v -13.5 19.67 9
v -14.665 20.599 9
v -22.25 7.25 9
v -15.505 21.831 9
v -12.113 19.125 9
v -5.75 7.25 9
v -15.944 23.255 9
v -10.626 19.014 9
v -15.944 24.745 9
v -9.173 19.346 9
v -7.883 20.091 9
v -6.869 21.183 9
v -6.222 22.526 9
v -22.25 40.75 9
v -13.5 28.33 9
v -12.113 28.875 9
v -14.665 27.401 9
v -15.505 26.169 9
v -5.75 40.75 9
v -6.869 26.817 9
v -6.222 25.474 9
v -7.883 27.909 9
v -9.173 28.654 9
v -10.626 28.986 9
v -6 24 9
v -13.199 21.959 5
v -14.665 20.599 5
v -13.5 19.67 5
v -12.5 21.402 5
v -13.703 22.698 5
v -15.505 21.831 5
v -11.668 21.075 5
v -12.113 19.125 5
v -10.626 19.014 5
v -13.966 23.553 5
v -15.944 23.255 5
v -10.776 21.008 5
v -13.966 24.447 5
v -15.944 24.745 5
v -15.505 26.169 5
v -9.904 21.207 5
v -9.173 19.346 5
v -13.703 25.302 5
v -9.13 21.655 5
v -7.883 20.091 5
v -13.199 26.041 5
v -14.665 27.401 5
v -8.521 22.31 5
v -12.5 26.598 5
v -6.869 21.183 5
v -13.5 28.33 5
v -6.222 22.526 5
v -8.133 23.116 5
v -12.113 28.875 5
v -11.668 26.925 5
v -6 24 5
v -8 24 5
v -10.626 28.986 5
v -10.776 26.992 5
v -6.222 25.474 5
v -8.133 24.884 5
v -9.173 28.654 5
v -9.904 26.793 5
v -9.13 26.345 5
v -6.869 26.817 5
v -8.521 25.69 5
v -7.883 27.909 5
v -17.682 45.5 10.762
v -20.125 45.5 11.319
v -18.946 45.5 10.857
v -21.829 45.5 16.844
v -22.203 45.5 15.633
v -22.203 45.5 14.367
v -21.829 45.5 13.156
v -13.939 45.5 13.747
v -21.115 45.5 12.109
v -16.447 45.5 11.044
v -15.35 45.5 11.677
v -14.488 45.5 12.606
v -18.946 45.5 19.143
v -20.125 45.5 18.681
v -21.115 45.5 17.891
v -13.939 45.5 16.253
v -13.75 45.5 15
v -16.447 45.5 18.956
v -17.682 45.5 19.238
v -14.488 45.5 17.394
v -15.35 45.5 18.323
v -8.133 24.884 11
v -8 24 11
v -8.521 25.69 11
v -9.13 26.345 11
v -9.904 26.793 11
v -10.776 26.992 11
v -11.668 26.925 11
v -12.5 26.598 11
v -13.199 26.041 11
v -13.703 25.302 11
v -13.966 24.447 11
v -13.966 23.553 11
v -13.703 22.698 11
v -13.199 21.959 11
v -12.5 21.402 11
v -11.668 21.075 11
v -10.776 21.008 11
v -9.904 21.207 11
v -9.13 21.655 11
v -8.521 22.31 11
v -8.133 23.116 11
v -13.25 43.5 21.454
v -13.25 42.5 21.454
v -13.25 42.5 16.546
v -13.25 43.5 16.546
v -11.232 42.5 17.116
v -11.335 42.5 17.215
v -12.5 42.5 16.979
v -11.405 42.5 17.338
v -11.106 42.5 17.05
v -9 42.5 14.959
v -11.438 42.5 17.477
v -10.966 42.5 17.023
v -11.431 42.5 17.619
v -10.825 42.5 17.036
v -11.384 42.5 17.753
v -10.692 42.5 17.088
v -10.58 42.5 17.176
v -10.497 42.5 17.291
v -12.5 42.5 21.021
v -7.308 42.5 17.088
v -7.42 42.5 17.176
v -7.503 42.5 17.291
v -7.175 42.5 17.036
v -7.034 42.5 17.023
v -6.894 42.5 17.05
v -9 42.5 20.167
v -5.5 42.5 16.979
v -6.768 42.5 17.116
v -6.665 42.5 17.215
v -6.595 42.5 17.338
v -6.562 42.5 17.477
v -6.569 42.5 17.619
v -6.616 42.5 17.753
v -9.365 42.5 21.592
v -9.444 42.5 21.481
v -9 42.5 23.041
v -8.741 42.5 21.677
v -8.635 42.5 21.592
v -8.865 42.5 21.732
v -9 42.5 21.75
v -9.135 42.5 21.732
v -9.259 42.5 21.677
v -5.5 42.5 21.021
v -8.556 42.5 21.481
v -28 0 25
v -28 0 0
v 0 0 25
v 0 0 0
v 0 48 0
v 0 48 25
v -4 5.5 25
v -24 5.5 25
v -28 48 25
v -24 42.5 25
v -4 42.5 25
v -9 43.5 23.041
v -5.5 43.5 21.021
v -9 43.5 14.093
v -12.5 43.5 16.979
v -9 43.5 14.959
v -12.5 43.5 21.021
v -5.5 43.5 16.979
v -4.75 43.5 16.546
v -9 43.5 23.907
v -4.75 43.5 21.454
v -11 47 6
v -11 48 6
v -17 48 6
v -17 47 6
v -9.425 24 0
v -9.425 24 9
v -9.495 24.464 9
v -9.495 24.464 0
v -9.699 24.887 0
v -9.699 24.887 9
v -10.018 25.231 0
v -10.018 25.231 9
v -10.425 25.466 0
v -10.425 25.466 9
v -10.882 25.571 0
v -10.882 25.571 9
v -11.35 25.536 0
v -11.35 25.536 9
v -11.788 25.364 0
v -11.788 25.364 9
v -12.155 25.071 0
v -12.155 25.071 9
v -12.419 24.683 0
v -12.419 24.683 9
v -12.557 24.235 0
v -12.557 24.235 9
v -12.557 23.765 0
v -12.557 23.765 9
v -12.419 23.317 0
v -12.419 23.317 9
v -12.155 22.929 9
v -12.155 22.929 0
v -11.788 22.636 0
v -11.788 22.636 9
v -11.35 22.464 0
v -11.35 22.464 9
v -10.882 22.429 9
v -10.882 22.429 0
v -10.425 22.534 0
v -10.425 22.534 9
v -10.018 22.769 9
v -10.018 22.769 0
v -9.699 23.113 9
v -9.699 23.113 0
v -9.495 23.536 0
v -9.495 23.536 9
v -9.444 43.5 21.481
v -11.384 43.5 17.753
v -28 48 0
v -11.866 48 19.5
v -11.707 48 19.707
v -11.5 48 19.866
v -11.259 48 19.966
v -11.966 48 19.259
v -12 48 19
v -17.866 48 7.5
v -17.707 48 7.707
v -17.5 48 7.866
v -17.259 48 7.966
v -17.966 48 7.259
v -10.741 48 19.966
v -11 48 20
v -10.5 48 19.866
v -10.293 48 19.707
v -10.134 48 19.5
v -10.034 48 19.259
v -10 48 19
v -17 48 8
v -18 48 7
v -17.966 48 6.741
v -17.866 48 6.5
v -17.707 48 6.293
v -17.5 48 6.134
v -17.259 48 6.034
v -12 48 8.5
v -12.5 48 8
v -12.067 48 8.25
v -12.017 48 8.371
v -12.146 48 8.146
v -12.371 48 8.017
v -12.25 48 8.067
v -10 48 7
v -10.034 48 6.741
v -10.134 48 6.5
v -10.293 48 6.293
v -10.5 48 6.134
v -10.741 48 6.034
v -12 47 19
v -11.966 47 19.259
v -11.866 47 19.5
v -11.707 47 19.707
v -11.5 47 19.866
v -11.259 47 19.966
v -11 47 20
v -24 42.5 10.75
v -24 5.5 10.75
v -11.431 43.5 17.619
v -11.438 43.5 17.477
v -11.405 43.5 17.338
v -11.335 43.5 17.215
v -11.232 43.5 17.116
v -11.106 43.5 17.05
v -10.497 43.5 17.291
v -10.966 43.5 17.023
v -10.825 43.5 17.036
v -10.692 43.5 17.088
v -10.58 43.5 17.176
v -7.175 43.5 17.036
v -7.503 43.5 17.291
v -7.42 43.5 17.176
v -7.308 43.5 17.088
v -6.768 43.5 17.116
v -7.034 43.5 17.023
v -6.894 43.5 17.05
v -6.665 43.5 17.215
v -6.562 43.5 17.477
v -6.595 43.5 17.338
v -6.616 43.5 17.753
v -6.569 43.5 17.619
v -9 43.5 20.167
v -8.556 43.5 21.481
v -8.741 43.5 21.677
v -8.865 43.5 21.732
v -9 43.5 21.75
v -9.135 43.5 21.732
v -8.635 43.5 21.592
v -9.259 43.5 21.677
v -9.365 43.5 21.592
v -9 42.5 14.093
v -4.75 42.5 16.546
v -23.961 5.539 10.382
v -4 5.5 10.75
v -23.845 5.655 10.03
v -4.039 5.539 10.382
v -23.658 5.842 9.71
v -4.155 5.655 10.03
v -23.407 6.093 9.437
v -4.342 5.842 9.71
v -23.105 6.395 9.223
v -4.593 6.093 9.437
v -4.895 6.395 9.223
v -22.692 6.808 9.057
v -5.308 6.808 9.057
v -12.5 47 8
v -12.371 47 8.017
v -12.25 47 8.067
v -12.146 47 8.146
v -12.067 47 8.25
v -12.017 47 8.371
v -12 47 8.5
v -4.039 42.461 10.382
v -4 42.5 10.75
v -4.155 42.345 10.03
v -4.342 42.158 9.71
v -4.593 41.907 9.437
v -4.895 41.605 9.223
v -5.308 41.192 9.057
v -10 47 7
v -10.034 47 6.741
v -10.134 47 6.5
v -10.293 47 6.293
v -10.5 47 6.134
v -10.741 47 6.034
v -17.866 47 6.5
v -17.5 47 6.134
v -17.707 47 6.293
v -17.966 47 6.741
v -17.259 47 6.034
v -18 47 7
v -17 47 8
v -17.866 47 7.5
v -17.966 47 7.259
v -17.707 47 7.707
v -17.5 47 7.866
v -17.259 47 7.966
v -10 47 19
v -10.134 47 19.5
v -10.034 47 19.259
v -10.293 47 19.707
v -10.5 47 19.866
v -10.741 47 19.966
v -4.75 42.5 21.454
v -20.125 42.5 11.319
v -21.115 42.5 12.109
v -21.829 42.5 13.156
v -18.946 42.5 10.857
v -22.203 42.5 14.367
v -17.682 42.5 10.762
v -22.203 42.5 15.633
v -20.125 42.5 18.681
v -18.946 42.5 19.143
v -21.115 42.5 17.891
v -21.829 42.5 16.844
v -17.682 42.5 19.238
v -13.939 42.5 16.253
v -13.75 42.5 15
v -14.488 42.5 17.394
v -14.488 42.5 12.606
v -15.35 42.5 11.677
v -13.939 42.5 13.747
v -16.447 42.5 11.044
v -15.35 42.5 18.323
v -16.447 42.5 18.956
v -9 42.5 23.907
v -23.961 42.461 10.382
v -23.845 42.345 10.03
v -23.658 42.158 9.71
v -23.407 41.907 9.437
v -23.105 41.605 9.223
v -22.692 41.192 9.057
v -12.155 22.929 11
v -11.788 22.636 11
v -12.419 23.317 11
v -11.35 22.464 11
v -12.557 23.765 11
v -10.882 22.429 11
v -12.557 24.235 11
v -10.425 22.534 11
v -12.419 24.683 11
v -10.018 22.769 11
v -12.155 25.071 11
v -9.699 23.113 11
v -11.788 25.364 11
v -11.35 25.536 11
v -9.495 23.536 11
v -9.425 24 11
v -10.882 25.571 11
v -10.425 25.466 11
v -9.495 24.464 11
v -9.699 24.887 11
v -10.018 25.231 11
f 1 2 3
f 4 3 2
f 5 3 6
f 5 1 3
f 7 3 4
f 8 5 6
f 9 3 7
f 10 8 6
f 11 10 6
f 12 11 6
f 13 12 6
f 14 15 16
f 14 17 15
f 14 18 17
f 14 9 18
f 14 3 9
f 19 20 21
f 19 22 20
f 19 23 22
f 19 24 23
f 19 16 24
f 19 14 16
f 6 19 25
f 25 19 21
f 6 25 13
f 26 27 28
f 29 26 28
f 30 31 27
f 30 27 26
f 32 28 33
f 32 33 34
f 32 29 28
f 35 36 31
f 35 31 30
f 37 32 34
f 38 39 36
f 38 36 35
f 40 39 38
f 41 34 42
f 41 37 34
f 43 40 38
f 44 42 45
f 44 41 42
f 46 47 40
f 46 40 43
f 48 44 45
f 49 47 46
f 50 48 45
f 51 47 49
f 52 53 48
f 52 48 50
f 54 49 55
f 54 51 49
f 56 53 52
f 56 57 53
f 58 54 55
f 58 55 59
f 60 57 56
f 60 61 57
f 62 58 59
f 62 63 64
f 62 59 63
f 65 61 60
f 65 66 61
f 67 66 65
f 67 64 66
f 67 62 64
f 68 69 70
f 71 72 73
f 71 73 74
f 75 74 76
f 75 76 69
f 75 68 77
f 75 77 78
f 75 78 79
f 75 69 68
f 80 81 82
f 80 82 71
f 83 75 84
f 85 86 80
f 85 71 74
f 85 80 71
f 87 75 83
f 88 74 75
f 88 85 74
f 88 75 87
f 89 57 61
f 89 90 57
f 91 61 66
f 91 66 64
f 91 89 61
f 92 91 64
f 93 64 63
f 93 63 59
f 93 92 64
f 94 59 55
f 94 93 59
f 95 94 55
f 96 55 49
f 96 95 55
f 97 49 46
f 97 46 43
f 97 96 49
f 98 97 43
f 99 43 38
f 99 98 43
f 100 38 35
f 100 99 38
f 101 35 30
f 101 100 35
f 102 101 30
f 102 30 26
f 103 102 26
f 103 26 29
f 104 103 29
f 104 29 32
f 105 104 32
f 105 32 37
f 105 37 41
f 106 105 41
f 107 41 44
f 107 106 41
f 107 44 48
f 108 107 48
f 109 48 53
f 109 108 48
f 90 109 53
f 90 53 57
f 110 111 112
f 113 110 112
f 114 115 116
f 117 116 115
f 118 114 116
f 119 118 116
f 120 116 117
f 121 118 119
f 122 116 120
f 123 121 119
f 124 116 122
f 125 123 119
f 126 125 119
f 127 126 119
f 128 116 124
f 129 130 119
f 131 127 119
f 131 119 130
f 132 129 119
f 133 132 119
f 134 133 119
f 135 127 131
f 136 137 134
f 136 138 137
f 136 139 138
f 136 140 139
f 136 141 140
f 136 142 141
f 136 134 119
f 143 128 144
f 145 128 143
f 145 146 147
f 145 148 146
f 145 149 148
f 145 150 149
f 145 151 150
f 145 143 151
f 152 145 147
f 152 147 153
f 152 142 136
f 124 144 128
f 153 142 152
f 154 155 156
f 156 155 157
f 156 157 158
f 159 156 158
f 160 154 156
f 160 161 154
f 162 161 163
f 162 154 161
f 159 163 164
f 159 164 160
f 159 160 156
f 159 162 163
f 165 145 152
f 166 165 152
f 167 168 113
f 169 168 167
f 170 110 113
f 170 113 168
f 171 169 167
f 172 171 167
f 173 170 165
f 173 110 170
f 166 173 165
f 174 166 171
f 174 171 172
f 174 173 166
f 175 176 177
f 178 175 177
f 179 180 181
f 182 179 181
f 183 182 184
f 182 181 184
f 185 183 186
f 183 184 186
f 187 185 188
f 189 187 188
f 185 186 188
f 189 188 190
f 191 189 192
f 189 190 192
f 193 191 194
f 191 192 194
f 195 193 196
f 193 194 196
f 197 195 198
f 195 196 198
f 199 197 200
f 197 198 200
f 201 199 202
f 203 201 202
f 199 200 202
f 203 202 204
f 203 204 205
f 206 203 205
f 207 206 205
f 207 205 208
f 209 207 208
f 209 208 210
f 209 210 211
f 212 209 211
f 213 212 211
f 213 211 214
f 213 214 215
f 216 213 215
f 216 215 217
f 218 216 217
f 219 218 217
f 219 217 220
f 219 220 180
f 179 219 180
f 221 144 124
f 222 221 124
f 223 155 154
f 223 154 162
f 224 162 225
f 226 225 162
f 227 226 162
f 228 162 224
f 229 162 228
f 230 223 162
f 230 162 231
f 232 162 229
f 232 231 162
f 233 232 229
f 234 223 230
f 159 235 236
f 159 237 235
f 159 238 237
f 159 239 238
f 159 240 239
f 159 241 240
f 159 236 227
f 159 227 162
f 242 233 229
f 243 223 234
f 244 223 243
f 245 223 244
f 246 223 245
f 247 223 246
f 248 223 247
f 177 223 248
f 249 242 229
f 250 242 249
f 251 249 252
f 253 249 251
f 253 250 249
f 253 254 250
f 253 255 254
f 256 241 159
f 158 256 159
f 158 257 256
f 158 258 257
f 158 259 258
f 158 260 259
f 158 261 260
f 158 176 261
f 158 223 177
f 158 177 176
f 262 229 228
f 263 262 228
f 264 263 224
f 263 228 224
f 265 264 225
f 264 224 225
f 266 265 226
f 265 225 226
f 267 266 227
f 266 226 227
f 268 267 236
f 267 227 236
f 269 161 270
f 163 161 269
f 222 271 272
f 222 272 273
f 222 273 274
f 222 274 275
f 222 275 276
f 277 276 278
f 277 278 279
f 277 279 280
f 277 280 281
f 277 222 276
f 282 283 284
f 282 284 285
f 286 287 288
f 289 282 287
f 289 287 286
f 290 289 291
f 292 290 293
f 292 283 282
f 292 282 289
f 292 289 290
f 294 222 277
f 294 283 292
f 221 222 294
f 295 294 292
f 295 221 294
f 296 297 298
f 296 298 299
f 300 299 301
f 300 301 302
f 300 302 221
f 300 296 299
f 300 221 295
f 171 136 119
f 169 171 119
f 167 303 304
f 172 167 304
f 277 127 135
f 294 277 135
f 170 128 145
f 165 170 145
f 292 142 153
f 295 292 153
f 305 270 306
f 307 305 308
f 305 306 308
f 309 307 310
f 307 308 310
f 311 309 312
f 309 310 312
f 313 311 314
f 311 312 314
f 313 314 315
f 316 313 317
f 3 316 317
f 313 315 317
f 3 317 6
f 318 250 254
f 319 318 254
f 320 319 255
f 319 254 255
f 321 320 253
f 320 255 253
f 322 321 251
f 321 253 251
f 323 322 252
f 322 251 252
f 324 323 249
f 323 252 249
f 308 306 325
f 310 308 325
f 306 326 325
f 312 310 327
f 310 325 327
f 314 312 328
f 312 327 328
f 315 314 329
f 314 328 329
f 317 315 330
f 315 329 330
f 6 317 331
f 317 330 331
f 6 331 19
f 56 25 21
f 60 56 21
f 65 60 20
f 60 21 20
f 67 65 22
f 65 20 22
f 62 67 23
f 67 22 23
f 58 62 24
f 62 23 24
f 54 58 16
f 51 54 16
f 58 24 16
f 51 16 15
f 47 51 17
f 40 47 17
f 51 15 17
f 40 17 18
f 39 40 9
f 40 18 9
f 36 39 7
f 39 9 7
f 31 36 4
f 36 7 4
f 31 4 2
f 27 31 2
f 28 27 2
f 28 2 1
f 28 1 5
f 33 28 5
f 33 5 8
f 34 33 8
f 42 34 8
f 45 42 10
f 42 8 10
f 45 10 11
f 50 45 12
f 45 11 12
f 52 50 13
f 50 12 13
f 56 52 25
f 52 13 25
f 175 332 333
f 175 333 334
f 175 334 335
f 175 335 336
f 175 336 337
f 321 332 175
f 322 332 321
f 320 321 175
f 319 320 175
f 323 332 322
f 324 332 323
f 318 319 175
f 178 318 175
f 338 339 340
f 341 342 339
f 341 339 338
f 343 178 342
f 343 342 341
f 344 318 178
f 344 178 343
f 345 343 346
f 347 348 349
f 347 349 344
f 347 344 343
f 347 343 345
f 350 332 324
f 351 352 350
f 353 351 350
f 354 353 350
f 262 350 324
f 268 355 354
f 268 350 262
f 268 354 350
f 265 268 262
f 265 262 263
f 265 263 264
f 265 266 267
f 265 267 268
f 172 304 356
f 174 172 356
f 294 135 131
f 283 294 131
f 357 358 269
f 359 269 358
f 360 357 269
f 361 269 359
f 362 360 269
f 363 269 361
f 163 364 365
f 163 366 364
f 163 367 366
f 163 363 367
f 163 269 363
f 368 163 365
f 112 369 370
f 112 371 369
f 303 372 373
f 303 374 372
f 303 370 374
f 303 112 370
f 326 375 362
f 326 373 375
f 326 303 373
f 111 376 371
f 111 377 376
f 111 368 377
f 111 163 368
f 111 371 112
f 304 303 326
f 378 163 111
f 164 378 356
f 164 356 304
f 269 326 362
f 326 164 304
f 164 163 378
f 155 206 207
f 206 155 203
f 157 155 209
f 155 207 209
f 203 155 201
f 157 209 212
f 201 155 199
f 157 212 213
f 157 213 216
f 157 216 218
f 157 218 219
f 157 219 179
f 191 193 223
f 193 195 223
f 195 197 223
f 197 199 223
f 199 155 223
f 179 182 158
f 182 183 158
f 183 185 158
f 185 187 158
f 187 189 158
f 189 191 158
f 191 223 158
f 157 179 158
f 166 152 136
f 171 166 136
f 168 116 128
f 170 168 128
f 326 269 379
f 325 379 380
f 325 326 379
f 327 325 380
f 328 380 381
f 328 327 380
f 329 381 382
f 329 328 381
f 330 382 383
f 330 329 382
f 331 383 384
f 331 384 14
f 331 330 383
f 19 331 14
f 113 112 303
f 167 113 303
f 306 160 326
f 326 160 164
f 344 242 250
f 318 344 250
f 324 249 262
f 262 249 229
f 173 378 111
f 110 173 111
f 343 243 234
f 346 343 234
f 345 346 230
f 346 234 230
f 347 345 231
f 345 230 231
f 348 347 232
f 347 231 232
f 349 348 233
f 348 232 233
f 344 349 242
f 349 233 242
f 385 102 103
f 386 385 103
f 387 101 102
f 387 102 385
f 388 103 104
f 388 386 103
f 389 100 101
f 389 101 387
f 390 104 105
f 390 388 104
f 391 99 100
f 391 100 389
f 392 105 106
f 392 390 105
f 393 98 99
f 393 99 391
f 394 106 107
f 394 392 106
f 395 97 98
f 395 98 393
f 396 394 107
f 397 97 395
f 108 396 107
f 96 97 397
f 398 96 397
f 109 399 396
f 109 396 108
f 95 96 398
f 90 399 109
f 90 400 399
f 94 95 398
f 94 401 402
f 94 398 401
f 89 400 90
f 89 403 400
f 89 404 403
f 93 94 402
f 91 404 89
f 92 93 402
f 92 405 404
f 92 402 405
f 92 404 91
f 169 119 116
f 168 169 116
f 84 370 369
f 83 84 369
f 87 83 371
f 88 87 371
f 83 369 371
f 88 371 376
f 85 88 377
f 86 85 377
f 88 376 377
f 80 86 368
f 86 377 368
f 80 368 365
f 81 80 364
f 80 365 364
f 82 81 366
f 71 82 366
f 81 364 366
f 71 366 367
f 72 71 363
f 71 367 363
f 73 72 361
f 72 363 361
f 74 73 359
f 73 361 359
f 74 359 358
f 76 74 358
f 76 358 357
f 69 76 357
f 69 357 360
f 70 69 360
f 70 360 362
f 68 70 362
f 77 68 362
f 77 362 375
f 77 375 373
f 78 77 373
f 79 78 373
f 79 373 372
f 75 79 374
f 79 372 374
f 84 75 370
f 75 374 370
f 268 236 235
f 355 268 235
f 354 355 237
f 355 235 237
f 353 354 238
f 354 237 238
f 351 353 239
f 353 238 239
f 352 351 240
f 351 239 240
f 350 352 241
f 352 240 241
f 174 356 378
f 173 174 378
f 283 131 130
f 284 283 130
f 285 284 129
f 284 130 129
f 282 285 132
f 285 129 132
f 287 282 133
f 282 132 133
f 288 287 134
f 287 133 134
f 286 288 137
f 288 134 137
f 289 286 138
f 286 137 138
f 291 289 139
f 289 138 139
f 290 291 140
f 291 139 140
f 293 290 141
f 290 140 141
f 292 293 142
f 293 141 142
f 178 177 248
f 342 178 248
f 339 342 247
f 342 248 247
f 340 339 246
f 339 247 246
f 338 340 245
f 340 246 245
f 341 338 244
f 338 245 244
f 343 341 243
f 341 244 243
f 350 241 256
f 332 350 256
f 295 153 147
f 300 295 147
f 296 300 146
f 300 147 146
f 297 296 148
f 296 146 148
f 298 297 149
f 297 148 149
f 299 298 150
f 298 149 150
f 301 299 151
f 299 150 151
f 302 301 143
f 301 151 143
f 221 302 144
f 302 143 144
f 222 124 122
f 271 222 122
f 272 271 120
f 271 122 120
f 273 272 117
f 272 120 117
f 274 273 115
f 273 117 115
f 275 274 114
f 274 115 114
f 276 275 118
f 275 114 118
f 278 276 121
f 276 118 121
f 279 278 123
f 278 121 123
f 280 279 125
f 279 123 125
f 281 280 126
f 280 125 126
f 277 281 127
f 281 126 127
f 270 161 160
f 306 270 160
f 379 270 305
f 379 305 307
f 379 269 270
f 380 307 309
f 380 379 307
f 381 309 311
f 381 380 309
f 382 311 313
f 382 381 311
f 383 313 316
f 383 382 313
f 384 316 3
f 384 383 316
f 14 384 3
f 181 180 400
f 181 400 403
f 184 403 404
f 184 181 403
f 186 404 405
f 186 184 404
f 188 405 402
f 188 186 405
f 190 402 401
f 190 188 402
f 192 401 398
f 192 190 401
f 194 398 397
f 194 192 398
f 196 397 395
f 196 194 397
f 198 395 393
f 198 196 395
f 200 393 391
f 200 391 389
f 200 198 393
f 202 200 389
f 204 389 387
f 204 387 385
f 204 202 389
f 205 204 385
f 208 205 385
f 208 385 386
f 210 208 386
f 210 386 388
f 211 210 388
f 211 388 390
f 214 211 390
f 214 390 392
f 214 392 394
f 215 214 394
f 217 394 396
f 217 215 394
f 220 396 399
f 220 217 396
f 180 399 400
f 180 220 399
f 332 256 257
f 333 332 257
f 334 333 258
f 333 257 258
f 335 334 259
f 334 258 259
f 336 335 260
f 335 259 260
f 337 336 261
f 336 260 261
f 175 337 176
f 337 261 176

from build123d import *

# Parameters (mm, degrees)
F0_W      = 28
F0_H      = 48
F1_DEPTH  = 25
F2_W      = 20
F2_H      = 37
F3_DEPTH  = 16
F4_R      = 3
F4_R_2    = 1.575
F5_DEPTH  = 2
F6_R      = 5
F6_R_2    = 3
F7_DEPTH  = 4
F9_DEPTH  = 9.001
F10_R     = 4.25
F11_DEPTH = 3
F13_DEPTH = 1
F17_DEPTH = 1
F18_R     = 1.74999


# Not quite as in the source:
# - a fillet or chamfer is up to 0.001 mm smaller than in the source, because OpenCascade refuses the exact size


with BuildPart() as f1:
    # F0 (on Top) → F1 (new body)
    with BuildSketch(Plane.XY):
        with Locations((-14, 24)):
            Rectangle(F0_W, F0_H)
    extrude(amount=F1_DEPTH)

    # F2 (on face) → F3 (cut)
    with BuildSketch(Plane.XY.offset(25)):
        with Locations((-14, 24)):
            Rectangle(F2_W, F2_H)
    extrude(amount=-F3_DEPTH, mode=Mode.SUBTRACT)

    # F4 (on face) → F5 (join)
    with BuildSketch(Plane.XY.offset(9)):
        with Locations((-11, 24)):
            Circle(F4_R)
        with Locations((-11, 24)):
            Circle(F4_R_2, mode=Mode.SUBTRACT)
    extrude(amount=F5_DEPTH)

    # F6 (on face) → F7 (cut)
    with BuildSketch(Plane.XY.offset(9)):
        with Locations((-11, 24)):
            Circle(F6_R)
        with Locations((-11, 24)):
            Circle(F6_R_2, mode=Mode.SUBTRACT)
    extrude(amount=-F7_DEPTH, mode=Mode.SUBTRACT)

    # F9 (cut, through all): a face of the model
    f9_faces = [f1.faces().sort_by_distance(p)[0] for p in [
        (-11, 24, 9),
    ]]
    extrude(f9_faces, amount=-F9_DEPTH, mode=Mode.SUBTRACT)

    # F10 (on face) → F11 (cut)
    with BuildSketch(Plane.XZ.offset(-42.5)):
        with Locations((-18, 15)):
            Circle(F10_R)
    extrude(amount=-F11_DEPTH, mode=Mode.SUBTRACT)

    # F12 (on face) → F13 (cut)
    with BuildSketch(Plane(origin=(0, 48, 0), x_dir=(-1, 0, 0), z_dir=(0, 1, 0))):
        with BuildLine():
            ThreePointArc((11, 20), (10.2928932188, 19.7071067812), (10, 19))
            Line((10, 19), (10, 7))
            ThreePointArc((10, 7), (10.2928932188, 6.2928932188), (11, 6))
            Line((11, 6), (17, 6))
            ThreePointArc((17, 6), (17.7071067812, 6.2928932188), (18, 7))
            ThreePointArc((18, 7), (17.7071067812, 7.7071067812), (17, 8))
            Line((17, 8), (12.5, 8))
            ThreePointArc((12.5, 8), (12.1464466094, 8.1464466094), (12, 8.5))
            Line((12, 8.5), (12, 19))
            ThreePointArc((12, 19), (11.7071067812, 19.7071067812), (11, 20))
        make_face()
    extrude(amount=-F13_DEPTH, mode=Mode.SUBTRACT)

    # F15 (on face) → F17 (cut)
    with BuildSketch(Plane.XZ.offset(-42.5)):
        Polygon((-9, 14.0925227119), (-4.75, 16.5462613559), (-4.75, 21.4537386441), (-9, 23.9074772881), (-13.25, 21.4537386441), (-13.25, 16.5462613559), align=None)
        Polygon((-9, 14.9585481157), (-12.5, 16.9792740578), (-12.5, 21.0207259422), (-9, 23.0414518843), (-5.5, 21.0207259422), (-5.5, 16.9792740578), align=None, mode=Mode.SUBTRACT)
        with BuildLine():
            Line((-10.4970194787, 17.2914120527), (-11.3840303118, 17.7531606659))
            ThreePointArc((-11.3840303118, 17.7531606659), (-11.1713992019, 17.0787809427), (-10.4970194787, 17.2914120527))
        make_face()
        with BuildLine():
            ThreePointArc((-9.4435054166, 21.0191256934), (-9.5, 21.25), (-9.4435054166, 21.4808743066))
            Line((-9.4435054166, 21.4808743066), (-11.3840303118, 17.7531606659))
            Line((-11.3840303118, 17.7531606659), (-10.4970194787, 17.2914120527))
            Line((-10.4970194787, 17.2914120527), (-9, 20.1671597149))
            Line((-9, 20.1671597149), (-9.4435054166, 21.0191256934))
        make_face()
        with BuildLine():
            ThreePointArc((-8.5564945834, 21.0191256934), (-8.5143289651, 21.1311570538), (-8.5, 21.25))
            ThreePointArc((-8.5, 21.25), (-8.5143289651, 21.3688429462), (-8.5564945834, 21.4808743066))
            ThreePointArc((-8.5564945834, 21.4808743066), (-9, 21.75), (-9.4435054166, 21.4808743066))
            ThreePointArc((-9.4435054166, 21.4808743066), (-9.5, 21.25), (-9.4435054166, 21.0191256934))
            ThreePointArc((-9.4435054166, 21.0191256934), (-9, 20.75), (-8.5564945834, 21.0191256934))
        make_face()
        with BuildLine():
            Line((-9, 20.1671597149), (-8.5564945834, 21.0191256934))
            ThreePointArc((-8.5564945834, 21.0191256934), (-9, 20.75), (-9.4435054166, 21.0191256934))
            Line((-9.4435054166, 21.0191256934), (-9, 20.1671597149))
        make_face()
        with BuildLine():
            ThreePointArc((-8.5564945834, 21.4808743066), (-8.5143289651, 21.3688429462), (-8.5, 21.25))
            ThreePointArc((-8.5, 21.25), (-8.5143289651, 21.1311570538), (-8.5564945834, 21.0191256934))
            Line((-8.5564945834, 21.0191256934), (-9, 20.1671597149))
            Line((-9, 20.1671597149), (-7.5029805213, 17.2914120527))
            Line((-7.5029805213, 17.2914120527), (-6.6159696882, 17.7531606659))
            Line((-6.6159696882, 17.7531606659), (-8.5564945834, 21.4808743066))
        make_face()
        with BuildLine():
            ThreePointArc((-7.5029805213, 17.2914120527), (-6.8286007981, 17.0787809427), (-6.6159696882, 17.7531606659))
            Line((-6.6159696882, 17.7531606659), (-7.5029805213, 17.2914120527))
        make_face()
    extrude(amount=-F17_DEPTH, mode=Mode.SUBTRACT)

    # F18 (radius 1.75 in the source; OpenCascade refuses exactly that, so slightly less here)
    f18_edges = [f1.edges().sort_by_distance(p)[0] for p in [
        (-24, 24, 9),
        (-14, 42.5, 9),
        (-4, 24, 9),
        (-14, 5.5, 9),
    ]]
    fillet(f18_edges, radius=F18_R)


solid = f1.part
